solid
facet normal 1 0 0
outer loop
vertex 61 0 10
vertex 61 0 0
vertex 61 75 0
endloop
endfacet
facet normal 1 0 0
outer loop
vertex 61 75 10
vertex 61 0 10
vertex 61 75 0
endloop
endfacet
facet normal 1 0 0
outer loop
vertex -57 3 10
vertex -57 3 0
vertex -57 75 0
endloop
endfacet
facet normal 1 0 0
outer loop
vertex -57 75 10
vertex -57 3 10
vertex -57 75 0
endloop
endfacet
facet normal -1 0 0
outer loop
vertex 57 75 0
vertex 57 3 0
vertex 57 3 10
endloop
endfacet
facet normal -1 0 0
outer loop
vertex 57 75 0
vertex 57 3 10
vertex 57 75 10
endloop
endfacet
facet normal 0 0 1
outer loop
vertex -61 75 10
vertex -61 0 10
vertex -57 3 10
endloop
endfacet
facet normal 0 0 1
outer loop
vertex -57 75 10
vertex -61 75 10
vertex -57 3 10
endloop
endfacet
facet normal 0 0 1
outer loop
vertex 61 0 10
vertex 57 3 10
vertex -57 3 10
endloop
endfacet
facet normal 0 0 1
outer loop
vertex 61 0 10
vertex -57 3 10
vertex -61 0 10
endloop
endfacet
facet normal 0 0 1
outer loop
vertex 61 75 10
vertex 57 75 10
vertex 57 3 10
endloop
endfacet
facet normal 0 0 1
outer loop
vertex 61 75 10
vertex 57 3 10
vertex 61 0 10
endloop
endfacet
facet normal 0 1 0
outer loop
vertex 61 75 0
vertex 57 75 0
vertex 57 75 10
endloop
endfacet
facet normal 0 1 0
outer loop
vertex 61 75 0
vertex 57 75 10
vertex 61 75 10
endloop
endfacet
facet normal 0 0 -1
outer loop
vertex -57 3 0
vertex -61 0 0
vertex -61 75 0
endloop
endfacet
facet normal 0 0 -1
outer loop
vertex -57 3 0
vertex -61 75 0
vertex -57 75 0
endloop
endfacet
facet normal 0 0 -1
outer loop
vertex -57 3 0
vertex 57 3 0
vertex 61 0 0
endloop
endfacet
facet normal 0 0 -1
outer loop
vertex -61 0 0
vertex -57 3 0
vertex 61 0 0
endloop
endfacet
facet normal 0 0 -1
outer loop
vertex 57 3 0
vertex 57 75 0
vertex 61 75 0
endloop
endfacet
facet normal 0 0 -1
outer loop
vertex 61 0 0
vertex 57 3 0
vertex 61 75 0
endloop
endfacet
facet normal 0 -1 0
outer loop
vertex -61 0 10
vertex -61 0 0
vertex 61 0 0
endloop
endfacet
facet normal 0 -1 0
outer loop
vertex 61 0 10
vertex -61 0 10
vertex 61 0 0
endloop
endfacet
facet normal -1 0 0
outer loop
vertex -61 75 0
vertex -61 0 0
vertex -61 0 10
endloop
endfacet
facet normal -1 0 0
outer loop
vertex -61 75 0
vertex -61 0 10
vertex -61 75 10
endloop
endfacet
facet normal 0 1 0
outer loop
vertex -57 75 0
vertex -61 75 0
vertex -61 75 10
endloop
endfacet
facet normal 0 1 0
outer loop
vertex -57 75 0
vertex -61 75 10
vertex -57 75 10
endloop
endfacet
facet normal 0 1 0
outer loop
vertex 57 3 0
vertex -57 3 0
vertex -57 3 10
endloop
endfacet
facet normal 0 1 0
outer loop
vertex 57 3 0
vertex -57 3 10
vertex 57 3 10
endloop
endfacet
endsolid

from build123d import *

# Parameters (mm, degrees)
SKETCH1_W             = 4
SKETCH1_H             = 75
BOSS_EXTRUDE1_DEPTH   = 10
BOSS_EXTRUDE1_2_DEPTH = 10
SKETCH3_W             = 122
SKETCH3_H             = 3
BOSS_EXTRUDE2_DEPTH   = 10


with BuildPart() as part:
    # Sketch1 → Boss-Extrude1 (new body)
    with BuildSketch(Plane.XY):
        with Locations((-59, 37.5)):
            Rectangle(SKETCH1_W, SKETCH1_H)
    extrude(amount=BOSS_EXTRUDE1_DEPTH)



with BuildPart() as body_2:
    # Sketch1 → Boss-Extrude1 2 (new body)
    with BuildSketch(Plane.XY):
        with Locations((59, 37.5)):
            Rectangle(SKETCH1_W, SKETCH1_H)
    extrude(amount=BOSS_EXTRUDE1_2_DEPTH)


with BuildPart() as part_1:
    add(part.part)

    add(body_2.part)  # Boss-Extrude2 merges body 2
    # Sketch3 → Boss-Extrude2 (add)
    with BuildSketch(Plane.XY):
        with Locations((0, 1.5)):
            Rectangle(SKETCH3_W, SKETCH3_H)
    extrude(amount=BOSS_EXTRUDE2_DEPTH)


solid = part_1.part
